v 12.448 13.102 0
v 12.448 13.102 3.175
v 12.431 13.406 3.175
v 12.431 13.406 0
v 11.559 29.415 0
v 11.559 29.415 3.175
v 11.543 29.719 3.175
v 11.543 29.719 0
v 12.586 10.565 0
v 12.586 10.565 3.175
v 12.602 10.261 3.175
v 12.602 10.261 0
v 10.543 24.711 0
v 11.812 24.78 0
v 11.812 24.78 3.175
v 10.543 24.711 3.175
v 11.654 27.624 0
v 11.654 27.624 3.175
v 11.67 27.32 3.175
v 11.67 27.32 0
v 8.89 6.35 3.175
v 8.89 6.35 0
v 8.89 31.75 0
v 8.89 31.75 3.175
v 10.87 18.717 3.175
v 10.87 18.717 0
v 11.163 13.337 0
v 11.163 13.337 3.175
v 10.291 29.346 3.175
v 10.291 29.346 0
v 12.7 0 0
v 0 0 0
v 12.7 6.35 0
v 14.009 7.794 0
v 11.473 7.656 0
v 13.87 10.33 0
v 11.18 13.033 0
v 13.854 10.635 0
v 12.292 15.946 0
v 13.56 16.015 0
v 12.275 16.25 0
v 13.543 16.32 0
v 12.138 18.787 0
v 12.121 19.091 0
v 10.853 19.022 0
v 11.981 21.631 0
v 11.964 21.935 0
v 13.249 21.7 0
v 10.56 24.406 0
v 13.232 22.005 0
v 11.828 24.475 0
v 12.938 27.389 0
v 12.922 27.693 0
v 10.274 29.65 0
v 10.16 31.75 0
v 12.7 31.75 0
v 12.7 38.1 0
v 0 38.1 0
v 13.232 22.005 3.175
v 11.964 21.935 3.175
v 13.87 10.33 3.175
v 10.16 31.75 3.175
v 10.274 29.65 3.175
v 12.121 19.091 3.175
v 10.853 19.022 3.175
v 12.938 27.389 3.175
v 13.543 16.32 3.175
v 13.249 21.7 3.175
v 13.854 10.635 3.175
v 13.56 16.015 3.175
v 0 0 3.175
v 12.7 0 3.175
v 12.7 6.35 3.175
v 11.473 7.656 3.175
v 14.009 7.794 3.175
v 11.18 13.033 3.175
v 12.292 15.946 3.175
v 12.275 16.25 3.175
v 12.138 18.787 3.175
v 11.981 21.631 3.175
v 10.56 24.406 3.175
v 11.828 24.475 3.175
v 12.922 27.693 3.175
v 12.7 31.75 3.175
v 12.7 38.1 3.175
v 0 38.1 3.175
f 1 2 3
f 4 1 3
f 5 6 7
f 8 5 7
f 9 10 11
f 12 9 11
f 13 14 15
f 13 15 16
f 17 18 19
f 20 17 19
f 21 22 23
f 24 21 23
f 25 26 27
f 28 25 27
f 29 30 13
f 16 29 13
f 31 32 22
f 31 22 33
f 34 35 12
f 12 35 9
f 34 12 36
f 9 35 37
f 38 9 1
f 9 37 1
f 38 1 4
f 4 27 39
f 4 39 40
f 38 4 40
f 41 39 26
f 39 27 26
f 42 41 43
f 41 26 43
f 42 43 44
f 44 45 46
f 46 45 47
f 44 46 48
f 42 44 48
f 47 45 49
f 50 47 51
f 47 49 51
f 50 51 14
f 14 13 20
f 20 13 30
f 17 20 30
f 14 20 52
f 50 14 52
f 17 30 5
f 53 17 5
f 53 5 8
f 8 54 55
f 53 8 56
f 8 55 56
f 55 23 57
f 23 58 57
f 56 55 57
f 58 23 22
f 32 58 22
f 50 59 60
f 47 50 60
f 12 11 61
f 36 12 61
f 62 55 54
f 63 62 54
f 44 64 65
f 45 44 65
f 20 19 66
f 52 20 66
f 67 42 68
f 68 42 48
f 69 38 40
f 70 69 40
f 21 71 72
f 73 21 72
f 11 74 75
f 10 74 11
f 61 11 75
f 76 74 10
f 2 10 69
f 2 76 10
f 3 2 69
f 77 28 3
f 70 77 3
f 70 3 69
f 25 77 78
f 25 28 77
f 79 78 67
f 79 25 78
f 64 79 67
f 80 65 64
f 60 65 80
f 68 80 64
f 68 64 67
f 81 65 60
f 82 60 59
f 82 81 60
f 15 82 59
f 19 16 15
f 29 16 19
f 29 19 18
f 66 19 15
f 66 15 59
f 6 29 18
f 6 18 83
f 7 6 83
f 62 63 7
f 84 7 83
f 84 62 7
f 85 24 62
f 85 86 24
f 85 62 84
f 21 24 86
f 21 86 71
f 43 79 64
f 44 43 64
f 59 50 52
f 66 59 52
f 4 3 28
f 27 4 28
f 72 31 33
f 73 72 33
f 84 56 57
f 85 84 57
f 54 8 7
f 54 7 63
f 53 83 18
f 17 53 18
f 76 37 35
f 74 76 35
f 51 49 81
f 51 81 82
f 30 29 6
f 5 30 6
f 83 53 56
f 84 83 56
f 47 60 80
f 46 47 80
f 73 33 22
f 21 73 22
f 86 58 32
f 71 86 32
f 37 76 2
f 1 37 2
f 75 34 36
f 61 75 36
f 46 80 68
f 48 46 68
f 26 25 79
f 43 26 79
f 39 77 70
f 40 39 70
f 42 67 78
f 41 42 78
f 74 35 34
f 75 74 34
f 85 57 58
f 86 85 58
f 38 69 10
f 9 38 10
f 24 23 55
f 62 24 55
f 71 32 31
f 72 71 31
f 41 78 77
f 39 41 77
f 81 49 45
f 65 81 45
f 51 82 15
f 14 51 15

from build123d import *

# Parameters (mm, degrees)
F1_DEPTH = 3.175
F3_DEPTH = 3.176


with BuildPart() as f1:
    # F0 (on Top) → F1 (new body)
    with BuildSketch(Plane.XY):
        Polygon((0, 38.1), (0, 0), (12.7, 0), (12.7, 6.35), (10.16, 6.35), (8.89, 6.35), (8.89, 31.75), (10.16, 31.75), (11.4725997902, 7.6557271994), (14.0088390323, 7.7938955983), (12.7, 31.75), (12.7, 38.1), align=None)
    extrude(amount=F1_DEPTH)

    # F2 (on face) → F3 (cut, through all)
    with BuildSketch(Plane.XY.offset(3.175)):
        Polygon((12.6021534372, 10.2610289821), (13.8702622136, 10.3303119605), (13.8536342988, 10.6346580668), (12.5855255224, 10.5653750884), align=None)
        Polygon((11.1631134086, 13.3367042667), (11.1796827872, 13.0325543411), (12.4478500998, 13.1016411387), (12.431222185, 13.4059872451), align=None)
        Polygon((13.5596651672, 16.0152702235), (13.5430372523, 16.3196163298), (12.2749284759, 16.2503333514), (12.2915563907, 15.9459872451), align=None)
        Polygon((12.1214685819, 19.0909911518), (10.8533966835, 19.0219095522), (10.8699877202, 18.7173620671), (12.1380964967, 18.7866450455), align=None)
        Polygon((13.249065627, 21.7002741302), (13.2324377121, 22.0046202366), (11.9643289357, 21.9353372582), (11.9809568505, 21.6309911518), align=None)
        Polygon((11.8116096197, 24.7796859673), (10.5434899986, 24.7106017678), (10.5600702065, 24.4062530587), (11.8281898276, 24.4753372582), align=None)
        Polygon((11.6701556579, 27.3196859673), (12.9382644344, 27.3889689457), (12.9216365196, 27.693315052), (11.6535277431, 27.6240320736), align=None)
        Polygon((10.2744032886, 29.6499965832), (10.2909834965, 29.3456478741), (11.5591031175, 29.4147320736), (11.5425229097, 29.7190807827), align=None)
        Polygon((12.7241392034, 7.7239081478), (11.4725997902, 7.6557271994), (11.4725997902, 7.3504752393), (12.7407194113, 7.4195594387), align=None)
        Polygon((14.083071413, 6.4351963108), (14.0664434982, 6.7395424171), (12.7983347217, 6.6702594387), (12.8149626365, 6.3659133324), align=None)
    extrude(amount=-F3_DEPTH, mode=Mode.SUBTRACT)


solid = f1.part
